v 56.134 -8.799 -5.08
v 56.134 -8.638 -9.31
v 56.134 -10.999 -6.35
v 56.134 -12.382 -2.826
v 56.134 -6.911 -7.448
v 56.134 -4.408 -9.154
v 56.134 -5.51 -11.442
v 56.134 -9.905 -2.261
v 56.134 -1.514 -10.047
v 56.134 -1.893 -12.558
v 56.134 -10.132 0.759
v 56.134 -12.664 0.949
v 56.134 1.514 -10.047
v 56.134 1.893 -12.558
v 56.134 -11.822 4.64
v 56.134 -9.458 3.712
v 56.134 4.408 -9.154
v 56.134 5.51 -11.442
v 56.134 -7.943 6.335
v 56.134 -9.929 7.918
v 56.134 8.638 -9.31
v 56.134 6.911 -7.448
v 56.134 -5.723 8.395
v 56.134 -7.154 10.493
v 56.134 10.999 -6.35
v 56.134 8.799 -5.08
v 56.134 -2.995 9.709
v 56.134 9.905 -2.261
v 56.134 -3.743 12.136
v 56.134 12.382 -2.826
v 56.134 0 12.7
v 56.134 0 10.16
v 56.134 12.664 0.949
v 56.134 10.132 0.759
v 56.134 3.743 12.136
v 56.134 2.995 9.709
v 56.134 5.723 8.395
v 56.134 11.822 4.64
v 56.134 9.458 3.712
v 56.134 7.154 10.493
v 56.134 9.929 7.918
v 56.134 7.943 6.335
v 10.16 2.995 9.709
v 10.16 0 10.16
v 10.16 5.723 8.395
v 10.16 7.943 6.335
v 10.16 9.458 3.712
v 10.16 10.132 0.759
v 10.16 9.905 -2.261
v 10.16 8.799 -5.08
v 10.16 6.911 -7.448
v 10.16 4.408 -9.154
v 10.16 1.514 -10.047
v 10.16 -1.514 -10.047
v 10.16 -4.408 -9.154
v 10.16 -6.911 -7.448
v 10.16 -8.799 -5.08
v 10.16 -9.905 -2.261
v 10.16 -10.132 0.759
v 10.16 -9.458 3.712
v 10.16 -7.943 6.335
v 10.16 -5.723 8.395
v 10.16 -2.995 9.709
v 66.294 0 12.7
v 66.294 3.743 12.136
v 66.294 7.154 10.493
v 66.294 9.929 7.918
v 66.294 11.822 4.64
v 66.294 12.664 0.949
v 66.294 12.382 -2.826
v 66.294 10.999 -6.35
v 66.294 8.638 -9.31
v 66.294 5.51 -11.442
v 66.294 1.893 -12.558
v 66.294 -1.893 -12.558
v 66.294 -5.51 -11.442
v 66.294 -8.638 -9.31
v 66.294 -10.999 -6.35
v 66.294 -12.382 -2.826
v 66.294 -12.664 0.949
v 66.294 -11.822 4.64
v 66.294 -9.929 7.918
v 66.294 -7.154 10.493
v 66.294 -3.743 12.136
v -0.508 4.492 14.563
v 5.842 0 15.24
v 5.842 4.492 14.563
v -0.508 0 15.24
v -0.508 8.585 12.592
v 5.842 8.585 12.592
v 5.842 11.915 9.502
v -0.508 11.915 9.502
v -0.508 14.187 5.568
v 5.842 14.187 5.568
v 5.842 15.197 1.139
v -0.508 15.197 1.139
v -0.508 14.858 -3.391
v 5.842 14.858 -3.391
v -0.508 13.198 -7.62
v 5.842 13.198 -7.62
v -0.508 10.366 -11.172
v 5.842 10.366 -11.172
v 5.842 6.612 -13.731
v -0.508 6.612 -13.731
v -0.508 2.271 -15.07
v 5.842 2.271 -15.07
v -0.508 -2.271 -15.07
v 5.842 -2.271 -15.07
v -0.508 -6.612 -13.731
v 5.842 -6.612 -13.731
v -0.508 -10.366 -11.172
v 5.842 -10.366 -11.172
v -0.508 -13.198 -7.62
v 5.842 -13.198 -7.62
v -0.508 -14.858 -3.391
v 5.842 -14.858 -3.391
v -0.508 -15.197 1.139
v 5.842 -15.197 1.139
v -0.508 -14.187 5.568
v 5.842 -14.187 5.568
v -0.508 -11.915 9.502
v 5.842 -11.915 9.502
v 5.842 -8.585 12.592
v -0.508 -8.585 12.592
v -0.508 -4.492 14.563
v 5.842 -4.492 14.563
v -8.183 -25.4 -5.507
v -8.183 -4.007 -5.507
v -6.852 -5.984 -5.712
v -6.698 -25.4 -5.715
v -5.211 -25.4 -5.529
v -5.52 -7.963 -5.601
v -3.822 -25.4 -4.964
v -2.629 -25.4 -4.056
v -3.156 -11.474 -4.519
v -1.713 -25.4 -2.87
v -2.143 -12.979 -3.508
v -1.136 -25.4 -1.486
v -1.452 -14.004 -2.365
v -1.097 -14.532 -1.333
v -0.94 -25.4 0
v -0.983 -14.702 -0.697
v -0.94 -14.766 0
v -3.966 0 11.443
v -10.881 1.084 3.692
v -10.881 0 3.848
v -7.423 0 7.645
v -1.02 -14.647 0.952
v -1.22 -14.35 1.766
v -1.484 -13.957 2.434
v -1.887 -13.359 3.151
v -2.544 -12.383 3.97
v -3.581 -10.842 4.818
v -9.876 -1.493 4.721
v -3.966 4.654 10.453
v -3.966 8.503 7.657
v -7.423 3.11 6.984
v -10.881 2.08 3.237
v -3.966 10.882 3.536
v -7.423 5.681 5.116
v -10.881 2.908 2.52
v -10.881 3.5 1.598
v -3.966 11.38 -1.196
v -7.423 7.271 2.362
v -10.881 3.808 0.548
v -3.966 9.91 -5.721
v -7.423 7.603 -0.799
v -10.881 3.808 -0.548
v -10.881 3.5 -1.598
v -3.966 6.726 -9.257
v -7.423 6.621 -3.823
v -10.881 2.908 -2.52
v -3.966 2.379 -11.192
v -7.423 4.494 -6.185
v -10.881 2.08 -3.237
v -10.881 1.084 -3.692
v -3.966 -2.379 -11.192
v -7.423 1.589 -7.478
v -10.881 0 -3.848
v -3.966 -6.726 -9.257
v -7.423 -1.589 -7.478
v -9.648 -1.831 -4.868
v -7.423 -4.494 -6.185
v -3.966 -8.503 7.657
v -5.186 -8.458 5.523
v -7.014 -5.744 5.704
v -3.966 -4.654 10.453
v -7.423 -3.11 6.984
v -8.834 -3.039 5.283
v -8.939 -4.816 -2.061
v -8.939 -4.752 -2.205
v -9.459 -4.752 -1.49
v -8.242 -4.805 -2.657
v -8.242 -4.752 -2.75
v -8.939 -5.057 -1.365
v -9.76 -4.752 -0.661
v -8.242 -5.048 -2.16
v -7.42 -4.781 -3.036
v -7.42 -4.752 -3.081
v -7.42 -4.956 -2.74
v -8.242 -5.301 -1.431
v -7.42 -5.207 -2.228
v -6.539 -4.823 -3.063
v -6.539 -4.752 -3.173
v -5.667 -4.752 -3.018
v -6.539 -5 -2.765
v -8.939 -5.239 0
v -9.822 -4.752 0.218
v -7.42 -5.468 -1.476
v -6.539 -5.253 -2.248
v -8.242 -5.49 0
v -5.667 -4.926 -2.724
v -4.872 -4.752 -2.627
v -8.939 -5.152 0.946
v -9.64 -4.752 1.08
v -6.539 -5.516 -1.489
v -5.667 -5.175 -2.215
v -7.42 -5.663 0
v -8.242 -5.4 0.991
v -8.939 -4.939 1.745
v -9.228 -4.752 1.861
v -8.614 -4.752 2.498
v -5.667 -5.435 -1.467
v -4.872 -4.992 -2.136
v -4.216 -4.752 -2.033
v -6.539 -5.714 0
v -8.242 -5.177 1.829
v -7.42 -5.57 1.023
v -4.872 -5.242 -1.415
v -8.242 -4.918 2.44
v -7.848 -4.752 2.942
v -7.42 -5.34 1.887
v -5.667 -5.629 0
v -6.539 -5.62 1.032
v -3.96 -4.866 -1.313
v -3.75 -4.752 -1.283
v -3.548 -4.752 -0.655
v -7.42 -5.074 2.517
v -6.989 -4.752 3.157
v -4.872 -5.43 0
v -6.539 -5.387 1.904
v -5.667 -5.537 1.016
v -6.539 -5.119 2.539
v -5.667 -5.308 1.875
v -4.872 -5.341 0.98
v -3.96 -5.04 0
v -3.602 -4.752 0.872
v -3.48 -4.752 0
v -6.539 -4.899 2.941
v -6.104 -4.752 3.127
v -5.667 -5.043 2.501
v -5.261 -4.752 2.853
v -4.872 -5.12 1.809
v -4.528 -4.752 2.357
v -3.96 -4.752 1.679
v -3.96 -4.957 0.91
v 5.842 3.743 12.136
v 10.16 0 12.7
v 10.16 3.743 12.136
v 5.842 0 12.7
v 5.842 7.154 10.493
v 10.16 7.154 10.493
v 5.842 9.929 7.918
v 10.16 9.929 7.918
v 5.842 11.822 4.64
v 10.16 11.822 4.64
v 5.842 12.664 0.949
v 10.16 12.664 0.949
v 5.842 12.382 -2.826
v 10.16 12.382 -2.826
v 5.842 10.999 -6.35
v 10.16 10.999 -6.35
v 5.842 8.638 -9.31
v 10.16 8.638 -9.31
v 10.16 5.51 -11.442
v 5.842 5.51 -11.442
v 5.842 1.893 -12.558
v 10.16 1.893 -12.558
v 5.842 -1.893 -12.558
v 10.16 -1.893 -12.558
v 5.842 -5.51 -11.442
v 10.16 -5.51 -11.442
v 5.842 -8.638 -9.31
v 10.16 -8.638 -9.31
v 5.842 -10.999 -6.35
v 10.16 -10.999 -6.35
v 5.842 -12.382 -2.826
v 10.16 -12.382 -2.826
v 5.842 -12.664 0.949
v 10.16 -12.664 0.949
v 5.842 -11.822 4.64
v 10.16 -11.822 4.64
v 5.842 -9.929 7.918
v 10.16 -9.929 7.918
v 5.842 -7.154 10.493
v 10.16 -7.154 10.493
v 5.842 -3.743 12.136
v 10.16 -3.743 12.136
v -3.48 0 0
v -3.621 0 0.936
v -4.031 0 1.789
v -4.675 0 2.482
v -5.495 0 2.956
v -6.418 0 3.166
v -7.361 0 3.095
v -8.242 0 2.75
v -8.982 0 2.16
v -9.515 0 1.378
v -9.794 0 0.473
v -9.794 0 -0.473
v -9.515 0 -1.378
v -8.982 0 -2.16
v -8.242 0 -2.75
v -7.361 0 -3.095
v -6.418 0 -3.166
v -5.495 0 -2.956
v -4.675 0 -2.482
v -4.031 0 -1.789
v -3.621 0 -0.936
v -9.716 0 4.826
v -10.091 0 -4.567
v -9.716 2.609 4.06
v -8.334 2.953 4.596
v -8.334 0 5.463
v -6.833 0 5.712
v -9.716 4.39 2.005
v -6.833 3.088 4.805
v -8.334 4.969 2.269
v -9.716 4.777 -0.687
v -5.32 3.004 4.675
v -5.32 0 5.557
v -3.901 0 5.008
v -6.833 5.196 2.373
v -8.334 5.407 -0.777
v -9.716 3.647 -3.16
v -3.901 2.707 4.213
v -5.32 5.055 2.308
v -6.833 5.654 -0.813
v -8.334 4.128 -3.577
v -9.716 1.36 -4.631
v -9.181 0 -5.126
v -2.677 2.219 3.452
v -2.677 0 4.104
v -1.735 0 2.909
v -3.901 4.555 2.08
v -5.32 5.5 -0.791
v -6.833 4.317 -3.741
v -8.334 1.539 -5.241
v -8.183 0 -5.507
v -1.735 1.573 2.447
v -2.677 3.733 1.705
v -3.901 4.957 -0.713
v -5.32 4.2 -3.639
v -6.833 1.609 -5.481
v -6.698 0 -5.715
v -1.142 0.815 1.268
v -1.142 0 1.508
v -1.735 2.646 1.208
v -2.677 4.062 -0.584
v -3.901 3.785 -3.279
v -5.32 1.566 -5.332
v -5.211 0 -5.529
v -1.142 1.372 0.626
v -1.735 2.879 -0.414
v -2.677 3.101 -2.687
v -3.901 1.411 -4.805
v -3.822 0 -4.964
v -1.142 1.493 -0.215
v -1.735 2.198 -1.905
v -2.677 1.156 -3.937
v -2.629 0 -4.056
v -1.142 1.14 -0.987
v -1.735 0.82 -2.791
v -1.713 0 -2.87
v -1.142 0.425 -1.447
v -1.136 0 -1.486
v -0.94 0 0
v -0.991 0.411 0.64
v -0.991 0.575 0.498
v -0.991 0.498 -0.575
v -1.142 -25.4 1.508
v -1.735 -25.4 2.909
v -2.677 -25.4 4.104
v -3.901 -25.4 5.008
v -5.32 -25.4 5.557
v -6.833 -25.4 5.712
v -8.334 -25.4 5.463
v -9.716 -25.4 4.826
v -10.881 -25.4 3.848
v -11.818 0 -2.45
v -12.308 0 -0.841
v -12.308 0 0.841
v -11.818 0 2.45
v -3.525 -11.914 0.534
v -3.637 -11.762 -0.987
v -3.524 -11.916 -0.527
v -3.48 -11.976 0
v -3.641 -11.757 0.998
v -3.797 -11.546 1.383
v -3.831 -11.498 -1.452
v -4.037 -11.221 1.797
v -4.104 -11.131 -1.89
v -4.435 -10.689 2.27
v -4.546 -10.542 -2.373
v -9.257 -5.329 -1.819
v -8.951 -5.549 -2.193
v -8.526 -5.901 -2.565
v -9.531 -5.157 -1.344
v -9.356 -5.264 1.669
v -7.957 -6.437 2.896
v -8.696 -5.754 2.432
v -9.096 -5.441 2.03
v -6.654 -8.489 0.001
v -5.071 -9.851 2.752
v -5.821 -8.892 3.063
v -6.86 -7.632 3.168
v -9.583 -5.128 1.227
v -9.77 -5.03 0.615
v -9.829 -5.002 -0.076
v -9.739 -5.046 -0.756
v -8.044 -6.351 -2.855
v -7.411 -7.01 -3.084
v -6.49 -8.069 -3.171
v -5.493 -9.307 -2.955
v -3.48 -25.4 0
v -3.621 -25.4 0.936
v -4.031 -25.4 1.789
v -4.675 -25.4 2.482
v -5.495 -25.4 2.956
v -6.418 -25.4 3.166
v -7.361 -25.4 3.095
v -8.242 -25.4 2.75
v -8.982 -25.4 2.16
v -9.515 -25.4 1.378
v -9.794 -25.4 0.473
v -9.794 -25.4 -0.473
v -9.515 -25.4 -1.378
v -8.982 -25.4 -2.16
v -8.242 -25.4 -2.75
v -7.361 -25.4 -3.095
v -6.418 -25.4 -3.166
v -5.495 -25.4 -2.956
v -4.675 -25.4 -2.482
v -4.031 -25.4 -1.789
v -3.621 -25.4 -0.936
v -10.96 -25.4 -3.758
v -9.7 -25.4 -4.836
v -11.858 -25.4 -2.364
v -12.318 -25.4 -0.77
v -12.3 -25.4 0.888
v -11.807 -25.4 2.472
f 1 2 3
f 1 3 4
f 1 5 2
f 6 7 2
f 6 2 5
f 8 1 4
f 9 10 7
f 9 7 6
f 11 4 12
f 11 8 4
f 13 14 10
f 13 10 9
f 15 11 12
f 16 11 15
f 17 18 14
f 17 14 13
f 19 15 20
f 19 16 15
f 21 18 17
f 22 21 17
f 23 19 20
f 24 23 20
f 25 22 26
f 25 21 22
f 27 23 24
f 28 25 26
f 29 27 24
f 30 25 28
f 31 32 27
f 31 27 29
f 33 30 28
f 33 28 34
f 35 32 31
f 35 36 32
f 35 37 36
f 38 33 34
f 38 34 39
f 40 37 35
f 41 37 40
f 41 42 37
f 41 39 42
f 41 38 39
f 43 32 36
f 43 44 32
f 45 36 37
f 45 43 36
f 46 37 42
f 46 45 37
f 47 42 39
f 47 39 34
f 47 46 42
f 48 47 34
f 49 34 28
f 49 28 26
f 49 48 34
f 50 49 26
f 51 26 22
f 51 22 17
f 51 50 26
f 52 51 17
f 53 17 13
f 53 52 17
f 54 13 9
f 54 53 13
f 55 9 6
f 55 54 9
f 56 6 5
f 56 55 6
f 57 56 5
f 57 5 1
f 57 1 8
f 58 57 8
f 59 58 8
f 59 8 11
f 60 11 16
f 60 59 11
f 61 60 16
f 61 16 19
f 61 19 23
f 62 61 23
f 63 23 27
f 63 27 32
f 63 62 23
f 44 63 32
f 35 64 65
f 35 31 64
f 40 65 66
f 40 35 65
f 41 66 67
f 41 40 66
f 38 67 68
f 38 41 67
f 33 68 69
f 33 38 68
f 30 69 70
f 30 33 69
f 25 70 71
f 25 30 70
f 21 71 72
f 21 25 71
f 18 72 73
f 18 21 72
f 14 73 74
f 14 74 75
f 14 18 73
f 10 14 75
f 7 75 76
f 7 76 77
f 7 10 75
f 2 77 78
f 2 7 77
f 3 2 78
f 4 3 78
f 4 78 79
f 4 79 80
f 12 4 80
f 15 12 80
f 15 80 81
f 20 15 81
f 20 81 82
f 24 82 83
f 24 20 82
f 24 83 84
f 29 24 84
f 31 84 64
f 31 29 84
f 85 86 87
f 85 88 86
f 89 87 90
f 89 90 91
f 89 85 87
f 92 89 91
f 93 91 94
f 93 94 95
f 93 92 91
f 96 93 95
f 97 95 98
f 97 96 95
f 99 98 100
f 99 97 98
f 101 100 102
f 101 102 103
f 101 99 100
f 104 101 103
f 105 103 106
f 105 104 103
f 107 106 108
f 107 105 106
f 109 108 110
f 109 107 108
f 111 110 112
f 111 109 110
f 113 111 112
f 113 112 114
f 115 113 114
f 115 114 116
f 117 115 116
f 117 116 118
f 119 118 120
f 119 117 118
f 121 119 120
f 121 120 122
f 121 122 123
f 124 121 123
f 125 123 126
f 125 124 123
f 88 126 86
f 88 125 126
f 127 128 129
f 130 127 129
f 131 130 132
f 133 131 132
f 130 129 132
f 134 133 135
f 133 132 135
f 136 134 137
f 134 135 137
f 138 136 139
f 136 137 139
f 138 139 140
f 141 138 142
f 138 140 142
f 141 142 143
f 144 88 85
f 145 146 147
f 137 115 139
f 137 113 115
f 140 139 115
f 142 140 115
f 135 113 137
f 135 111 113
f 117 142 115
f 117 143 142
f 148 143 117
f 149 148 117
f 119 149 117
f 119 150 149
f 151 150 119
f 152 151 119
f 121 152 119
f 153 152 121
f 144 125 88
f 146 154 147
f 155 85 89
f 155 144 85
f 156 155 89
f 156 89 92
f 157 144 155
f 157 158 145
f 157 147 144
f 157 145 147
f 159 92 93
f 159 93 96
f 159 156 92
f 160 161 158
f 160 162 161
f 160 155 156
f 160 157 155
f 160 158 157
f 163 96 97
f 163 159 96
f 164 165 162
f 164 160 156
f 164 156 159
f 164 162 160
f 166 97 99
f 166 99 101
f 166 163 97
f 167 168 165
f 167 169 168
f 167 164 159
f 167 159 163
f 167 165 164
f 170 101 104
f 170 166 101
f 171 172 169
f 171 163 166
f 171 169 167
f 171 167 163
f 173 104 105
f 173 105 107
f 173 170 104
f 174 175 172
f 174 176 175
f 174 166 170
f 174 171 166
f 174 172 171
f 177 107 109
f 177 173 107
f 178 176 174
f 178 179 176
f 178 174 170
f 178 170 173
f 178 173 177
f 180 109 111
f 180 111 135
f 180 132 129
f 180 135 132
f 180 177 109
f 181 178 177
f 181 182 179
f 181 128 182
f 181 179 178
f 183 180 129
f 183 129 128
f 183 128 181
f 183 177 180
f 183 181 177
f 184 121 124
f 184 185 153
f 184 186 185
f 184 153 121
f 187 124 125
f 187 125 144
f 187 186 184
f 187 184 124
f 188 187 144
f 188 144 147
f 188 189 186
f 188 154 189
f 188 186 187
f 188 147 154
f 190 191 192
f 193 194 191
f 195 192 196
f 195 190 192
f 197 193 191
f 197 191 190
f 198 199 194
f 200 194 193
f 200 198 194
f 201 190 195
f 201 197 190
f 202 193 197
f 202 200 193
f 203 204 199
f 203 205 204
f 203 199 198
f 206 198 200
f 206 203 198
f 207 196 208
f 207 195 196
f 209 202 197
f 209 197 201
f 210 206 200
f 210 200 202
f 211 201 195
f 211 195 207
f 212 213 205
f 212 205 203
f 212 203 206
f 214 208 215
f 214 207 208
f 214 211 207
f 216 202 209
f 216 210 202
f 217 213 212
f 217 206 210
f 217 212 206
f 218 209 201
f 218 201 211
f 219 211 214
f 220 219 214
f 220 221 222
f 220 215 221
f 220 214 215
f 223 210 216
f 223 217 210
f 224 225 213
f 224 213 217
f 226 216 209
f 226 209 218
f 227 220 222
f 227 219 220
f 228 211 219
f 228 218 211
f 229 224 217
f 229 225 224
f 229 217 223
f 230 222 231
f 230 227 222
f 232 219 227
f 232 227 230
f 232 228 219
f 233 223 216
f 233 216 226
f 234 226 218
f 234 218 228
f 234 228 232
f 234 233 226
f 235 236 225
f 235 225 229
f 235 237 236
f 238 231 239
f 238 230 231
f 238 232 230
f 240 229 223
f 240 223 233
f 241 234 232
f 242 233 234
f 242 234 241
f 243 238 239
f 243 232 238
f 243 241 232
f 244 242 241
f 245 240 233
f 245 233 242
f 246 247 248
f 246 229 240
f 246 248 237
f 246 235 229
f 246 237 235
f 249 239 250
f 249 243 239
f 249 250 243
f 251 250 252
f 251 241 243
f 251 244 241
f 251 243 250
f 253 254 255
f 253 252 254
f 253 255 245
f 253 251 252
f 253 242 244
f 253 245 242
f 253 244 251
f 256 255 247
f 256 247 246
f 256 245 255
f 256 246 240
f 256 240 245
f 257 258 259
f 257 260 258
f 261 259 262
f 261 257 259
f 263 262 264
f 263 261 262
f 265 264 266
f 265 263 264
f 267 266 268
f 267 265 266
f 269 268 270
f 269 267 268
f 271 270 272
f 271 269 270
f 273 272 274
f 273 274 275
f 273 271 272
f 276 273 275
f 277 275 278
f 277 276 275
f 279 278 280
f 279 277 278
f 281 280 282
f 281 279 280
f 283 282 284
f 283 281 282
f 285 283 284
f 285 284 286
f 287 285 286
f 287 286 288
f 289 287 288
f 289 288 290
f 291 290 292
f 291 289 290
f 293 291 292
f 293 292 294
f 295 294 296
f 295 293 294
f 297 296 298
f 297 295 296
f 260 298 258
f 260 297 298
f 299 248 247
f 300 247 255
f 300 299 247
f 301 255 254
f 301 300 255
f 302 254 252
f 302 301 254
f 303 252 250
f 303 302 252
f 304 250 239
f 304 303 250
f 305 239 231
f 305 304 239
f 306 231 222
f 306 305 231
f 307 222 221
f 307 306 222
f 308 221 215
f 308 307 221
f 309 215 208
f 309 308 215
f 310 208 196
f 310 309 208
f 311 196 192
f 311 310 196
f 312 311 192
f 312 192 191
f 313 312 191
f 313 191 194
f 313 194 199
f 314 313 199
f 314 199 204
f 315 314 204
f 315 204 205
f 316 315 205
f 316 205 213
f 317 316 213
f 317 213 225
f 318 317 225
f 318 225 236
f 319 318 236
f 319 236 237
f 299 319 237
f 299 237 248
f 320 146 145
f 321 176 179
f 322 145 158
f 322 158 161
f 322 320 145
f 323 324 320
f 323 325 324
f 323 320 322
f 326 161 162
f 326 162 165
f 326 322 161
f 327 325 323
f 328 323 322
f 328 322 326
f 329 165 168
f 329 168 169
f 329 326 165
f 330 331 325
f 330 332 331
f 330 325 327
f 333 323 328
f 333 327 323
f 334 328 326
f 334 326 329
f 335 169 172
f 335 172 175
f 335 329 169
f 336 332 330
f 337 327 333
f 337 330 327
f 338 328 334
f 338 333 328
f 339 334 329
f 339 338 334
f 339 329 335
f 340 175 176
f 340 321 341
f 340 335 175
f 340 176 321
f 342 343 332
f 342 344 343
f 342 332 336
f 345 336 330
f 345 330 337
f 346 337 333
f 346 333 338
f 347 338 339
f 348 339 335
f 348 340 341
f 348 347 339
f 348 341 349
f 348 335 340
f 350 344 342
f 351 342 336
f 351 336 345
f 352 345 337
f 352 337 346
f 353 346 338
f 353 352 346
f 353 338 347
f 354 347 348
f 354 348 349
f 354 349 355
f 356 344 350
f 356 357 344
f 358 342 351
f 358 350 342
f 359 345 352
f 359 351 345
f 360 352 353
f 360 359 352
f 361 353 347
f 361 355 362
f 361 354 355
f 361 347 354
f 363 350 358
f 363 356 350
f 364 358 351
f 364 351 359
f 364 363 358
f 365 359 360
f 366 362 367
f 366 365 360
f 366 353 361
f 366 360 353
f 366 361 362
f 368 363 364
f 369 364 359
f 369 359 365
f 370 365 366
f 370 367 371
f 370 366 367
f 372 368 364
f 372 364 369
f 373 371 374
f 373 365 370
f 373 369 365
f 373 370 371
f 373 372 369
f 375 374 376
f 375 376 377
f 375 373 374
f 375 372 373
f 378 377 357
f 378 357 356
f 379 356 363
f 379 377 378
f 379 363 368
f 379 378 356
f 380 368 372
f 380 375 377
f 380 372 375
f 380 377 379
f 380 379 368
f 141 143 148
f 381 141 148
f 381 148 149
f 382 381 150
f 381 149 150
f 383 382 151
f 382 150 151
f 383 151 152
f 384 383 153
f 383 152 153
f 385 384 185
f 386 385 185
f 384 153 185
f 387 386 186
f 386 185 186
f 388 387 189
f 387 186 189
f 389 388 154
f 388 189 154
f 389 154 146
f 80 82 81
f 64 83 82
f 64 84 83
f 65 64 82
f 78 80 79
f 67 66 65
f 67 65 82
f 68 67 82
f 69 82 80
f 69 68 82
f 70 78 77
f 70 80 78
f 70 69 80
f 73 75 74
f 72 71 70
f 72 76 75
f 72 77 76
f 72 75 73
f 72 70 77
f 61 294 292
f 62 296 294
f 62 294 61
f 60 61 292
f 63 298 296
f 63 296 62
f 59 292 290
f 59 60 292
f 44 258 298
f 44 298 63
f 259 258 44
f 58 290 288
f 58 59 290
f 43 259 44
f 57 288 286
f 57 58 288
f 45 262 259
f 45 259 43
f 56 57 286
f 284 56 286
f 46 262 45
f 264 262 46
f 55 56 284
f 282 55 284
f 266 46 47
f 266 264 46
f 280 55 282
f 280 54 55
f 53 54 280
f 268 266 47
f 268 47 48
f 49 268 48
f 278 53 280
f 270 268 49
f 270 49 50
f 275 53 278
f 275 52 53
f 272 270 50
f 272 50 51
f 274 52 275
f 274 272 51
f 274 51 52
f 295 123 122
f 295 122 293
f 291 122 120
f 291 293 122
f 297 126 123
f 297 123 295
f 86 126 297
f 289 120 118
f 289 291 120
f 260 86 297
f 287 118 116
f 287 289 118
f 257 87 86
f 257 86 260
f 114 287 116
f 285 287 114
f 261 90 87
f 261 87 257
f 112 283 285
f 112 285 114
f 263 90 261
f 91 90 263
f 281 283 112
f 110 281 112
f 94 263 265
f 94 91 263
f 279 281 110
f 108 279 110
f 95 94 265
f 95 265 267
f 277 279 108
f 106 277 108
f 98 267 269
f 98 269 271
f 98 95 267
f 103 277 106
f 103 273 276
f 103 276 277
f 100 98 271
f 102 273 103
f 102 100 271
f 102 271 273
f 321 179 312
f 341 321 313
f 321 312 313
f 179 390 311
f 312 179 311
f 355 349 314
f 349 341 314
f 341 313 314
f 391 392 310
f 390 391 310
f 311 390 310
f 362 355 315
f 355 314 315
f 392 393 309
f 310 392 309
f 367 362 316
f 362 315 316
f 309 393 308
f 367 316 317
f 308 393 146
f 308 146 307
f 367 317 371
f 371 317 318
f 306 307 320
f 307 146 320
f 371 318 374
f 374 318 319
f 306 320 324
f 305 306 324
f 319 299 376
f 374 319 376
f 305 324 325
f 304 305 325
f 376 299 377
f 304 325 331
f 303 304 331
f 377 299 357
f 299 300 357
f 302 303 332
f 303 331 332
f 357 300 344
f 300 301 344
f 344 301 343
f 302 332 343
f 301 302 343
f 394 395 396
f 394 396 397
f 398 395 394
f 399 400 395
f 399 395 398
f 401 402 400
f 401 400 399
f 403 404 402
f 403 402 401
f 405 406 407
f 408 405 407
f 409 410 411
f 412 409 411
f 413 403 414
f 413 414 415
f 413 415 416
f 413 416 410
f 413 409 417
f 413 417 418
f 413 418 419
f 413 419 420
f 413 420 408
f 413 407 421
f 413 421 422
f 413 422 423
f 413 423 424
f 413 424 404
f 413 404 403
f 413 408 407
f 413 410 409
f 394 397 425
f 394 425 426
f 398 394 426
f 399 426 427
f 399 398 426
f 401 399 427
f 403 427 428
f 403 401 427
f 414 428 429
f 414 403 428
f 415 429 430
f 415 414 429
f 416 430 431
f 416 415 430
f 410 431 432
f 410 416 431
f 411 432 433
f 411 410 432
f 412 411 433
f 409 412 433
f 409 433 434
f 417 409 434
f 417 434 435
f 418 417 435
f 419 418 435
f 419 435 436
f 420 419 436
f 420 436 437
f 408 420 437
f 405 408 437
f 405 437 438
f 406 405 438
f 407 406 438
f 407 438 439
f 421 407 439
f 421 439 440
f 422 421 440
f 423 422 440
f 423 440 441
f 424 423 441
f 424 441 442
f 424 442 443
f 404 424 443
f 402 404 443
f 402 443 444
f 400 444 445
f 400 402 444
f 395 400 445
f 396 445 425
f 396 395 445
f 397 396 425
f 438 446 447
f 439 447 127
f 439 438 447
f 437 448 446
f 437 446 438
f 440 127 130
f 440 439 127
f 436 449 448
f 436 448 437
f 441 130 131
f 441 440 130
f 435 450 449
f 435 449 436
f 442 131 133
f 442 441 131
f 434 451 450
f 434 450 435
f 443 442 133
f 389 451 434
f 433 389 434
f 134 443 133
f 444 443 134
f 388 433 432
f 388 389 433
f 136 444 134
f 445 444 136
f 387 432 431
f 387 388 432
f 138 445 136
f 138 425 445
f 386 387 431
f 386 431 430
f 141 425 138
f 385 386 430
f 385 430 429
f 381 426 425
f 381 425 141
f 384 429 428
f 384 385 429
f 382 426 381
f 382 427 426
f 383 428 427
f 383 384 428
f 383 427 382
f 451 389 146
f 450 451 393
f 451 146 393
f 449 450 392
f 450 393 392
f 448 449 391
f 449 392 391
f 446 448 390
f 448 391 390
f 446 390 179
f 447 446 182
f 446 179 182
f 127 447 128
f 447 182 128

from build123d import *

# Parameters (mm, degrees)
F0_W     = 5.842
F0_H     = 12.7
F0_R     = 3.175
F3_DEPTH = 25.4


with BuildPart() as f1:
    # F0 (on Front) → F1 (revolve)
    with BuildSketch(Plane.XZ):
        with Locations((2.921, 6.35)):
            Rectangle(F0_W, F0_H)
        with BuildLine():
            Line((-0.9398, 0), (0, 0))
            Line((0, 0), (0, 12.7))
            Line((0, 12.7), (5.842, 12.7))
            Line((5.842, 12.7), (5.842, 15.24))
            Line((5.842, 15.24), (-0.508, 15.24))
            Line((-0.508, 15.24), (-10.88063, 3.847543))
            ThreePointArc((-10.88063, 3.847543), (-4.591961, 5.329721), (-0.9398, 0))
        make_face()
    revolve(axis=Axis((33.147, 0, 0), (-1, 0, 0)))

    # F0 (on Front) → F2 (revolve)
    with BuildSketch(Plane.XZ):
        Polygon((5.842, 12.7), (5.842, 0), (66.294, 0), (66.294, 12.7), (56.134, 12.7), (56.134, 10.16), (10.16, 10.16), (10.16, 12.7), align=None)
    revolve(axis=Axis((33.147, 0, 0), (-1, 0, 0)))

    # F0 (on Front) → F3 (join)
    with BuildSketch(Plane.XZ):
        with BuildLine():
            ThreePointArc((-8.182663, -5.506983), (-3.195791, -4.549339), (-0.9398, 0))
            ThreePointArc((-0.9398, 0), (-4.591961, 5.329721), (-10.88063, 3.847543))
            ThreePointArc((-10.88063, 3.847543), (-12.145978, -1.583727), (-8.182663, -5.506983))
        make_face()
        with Locations((-6.6548, 0)):
            Circle(F0_R, mode=Mode.SUBTRACT)
    extrude(amount=F3_DEPTH)


solid = f1.part
